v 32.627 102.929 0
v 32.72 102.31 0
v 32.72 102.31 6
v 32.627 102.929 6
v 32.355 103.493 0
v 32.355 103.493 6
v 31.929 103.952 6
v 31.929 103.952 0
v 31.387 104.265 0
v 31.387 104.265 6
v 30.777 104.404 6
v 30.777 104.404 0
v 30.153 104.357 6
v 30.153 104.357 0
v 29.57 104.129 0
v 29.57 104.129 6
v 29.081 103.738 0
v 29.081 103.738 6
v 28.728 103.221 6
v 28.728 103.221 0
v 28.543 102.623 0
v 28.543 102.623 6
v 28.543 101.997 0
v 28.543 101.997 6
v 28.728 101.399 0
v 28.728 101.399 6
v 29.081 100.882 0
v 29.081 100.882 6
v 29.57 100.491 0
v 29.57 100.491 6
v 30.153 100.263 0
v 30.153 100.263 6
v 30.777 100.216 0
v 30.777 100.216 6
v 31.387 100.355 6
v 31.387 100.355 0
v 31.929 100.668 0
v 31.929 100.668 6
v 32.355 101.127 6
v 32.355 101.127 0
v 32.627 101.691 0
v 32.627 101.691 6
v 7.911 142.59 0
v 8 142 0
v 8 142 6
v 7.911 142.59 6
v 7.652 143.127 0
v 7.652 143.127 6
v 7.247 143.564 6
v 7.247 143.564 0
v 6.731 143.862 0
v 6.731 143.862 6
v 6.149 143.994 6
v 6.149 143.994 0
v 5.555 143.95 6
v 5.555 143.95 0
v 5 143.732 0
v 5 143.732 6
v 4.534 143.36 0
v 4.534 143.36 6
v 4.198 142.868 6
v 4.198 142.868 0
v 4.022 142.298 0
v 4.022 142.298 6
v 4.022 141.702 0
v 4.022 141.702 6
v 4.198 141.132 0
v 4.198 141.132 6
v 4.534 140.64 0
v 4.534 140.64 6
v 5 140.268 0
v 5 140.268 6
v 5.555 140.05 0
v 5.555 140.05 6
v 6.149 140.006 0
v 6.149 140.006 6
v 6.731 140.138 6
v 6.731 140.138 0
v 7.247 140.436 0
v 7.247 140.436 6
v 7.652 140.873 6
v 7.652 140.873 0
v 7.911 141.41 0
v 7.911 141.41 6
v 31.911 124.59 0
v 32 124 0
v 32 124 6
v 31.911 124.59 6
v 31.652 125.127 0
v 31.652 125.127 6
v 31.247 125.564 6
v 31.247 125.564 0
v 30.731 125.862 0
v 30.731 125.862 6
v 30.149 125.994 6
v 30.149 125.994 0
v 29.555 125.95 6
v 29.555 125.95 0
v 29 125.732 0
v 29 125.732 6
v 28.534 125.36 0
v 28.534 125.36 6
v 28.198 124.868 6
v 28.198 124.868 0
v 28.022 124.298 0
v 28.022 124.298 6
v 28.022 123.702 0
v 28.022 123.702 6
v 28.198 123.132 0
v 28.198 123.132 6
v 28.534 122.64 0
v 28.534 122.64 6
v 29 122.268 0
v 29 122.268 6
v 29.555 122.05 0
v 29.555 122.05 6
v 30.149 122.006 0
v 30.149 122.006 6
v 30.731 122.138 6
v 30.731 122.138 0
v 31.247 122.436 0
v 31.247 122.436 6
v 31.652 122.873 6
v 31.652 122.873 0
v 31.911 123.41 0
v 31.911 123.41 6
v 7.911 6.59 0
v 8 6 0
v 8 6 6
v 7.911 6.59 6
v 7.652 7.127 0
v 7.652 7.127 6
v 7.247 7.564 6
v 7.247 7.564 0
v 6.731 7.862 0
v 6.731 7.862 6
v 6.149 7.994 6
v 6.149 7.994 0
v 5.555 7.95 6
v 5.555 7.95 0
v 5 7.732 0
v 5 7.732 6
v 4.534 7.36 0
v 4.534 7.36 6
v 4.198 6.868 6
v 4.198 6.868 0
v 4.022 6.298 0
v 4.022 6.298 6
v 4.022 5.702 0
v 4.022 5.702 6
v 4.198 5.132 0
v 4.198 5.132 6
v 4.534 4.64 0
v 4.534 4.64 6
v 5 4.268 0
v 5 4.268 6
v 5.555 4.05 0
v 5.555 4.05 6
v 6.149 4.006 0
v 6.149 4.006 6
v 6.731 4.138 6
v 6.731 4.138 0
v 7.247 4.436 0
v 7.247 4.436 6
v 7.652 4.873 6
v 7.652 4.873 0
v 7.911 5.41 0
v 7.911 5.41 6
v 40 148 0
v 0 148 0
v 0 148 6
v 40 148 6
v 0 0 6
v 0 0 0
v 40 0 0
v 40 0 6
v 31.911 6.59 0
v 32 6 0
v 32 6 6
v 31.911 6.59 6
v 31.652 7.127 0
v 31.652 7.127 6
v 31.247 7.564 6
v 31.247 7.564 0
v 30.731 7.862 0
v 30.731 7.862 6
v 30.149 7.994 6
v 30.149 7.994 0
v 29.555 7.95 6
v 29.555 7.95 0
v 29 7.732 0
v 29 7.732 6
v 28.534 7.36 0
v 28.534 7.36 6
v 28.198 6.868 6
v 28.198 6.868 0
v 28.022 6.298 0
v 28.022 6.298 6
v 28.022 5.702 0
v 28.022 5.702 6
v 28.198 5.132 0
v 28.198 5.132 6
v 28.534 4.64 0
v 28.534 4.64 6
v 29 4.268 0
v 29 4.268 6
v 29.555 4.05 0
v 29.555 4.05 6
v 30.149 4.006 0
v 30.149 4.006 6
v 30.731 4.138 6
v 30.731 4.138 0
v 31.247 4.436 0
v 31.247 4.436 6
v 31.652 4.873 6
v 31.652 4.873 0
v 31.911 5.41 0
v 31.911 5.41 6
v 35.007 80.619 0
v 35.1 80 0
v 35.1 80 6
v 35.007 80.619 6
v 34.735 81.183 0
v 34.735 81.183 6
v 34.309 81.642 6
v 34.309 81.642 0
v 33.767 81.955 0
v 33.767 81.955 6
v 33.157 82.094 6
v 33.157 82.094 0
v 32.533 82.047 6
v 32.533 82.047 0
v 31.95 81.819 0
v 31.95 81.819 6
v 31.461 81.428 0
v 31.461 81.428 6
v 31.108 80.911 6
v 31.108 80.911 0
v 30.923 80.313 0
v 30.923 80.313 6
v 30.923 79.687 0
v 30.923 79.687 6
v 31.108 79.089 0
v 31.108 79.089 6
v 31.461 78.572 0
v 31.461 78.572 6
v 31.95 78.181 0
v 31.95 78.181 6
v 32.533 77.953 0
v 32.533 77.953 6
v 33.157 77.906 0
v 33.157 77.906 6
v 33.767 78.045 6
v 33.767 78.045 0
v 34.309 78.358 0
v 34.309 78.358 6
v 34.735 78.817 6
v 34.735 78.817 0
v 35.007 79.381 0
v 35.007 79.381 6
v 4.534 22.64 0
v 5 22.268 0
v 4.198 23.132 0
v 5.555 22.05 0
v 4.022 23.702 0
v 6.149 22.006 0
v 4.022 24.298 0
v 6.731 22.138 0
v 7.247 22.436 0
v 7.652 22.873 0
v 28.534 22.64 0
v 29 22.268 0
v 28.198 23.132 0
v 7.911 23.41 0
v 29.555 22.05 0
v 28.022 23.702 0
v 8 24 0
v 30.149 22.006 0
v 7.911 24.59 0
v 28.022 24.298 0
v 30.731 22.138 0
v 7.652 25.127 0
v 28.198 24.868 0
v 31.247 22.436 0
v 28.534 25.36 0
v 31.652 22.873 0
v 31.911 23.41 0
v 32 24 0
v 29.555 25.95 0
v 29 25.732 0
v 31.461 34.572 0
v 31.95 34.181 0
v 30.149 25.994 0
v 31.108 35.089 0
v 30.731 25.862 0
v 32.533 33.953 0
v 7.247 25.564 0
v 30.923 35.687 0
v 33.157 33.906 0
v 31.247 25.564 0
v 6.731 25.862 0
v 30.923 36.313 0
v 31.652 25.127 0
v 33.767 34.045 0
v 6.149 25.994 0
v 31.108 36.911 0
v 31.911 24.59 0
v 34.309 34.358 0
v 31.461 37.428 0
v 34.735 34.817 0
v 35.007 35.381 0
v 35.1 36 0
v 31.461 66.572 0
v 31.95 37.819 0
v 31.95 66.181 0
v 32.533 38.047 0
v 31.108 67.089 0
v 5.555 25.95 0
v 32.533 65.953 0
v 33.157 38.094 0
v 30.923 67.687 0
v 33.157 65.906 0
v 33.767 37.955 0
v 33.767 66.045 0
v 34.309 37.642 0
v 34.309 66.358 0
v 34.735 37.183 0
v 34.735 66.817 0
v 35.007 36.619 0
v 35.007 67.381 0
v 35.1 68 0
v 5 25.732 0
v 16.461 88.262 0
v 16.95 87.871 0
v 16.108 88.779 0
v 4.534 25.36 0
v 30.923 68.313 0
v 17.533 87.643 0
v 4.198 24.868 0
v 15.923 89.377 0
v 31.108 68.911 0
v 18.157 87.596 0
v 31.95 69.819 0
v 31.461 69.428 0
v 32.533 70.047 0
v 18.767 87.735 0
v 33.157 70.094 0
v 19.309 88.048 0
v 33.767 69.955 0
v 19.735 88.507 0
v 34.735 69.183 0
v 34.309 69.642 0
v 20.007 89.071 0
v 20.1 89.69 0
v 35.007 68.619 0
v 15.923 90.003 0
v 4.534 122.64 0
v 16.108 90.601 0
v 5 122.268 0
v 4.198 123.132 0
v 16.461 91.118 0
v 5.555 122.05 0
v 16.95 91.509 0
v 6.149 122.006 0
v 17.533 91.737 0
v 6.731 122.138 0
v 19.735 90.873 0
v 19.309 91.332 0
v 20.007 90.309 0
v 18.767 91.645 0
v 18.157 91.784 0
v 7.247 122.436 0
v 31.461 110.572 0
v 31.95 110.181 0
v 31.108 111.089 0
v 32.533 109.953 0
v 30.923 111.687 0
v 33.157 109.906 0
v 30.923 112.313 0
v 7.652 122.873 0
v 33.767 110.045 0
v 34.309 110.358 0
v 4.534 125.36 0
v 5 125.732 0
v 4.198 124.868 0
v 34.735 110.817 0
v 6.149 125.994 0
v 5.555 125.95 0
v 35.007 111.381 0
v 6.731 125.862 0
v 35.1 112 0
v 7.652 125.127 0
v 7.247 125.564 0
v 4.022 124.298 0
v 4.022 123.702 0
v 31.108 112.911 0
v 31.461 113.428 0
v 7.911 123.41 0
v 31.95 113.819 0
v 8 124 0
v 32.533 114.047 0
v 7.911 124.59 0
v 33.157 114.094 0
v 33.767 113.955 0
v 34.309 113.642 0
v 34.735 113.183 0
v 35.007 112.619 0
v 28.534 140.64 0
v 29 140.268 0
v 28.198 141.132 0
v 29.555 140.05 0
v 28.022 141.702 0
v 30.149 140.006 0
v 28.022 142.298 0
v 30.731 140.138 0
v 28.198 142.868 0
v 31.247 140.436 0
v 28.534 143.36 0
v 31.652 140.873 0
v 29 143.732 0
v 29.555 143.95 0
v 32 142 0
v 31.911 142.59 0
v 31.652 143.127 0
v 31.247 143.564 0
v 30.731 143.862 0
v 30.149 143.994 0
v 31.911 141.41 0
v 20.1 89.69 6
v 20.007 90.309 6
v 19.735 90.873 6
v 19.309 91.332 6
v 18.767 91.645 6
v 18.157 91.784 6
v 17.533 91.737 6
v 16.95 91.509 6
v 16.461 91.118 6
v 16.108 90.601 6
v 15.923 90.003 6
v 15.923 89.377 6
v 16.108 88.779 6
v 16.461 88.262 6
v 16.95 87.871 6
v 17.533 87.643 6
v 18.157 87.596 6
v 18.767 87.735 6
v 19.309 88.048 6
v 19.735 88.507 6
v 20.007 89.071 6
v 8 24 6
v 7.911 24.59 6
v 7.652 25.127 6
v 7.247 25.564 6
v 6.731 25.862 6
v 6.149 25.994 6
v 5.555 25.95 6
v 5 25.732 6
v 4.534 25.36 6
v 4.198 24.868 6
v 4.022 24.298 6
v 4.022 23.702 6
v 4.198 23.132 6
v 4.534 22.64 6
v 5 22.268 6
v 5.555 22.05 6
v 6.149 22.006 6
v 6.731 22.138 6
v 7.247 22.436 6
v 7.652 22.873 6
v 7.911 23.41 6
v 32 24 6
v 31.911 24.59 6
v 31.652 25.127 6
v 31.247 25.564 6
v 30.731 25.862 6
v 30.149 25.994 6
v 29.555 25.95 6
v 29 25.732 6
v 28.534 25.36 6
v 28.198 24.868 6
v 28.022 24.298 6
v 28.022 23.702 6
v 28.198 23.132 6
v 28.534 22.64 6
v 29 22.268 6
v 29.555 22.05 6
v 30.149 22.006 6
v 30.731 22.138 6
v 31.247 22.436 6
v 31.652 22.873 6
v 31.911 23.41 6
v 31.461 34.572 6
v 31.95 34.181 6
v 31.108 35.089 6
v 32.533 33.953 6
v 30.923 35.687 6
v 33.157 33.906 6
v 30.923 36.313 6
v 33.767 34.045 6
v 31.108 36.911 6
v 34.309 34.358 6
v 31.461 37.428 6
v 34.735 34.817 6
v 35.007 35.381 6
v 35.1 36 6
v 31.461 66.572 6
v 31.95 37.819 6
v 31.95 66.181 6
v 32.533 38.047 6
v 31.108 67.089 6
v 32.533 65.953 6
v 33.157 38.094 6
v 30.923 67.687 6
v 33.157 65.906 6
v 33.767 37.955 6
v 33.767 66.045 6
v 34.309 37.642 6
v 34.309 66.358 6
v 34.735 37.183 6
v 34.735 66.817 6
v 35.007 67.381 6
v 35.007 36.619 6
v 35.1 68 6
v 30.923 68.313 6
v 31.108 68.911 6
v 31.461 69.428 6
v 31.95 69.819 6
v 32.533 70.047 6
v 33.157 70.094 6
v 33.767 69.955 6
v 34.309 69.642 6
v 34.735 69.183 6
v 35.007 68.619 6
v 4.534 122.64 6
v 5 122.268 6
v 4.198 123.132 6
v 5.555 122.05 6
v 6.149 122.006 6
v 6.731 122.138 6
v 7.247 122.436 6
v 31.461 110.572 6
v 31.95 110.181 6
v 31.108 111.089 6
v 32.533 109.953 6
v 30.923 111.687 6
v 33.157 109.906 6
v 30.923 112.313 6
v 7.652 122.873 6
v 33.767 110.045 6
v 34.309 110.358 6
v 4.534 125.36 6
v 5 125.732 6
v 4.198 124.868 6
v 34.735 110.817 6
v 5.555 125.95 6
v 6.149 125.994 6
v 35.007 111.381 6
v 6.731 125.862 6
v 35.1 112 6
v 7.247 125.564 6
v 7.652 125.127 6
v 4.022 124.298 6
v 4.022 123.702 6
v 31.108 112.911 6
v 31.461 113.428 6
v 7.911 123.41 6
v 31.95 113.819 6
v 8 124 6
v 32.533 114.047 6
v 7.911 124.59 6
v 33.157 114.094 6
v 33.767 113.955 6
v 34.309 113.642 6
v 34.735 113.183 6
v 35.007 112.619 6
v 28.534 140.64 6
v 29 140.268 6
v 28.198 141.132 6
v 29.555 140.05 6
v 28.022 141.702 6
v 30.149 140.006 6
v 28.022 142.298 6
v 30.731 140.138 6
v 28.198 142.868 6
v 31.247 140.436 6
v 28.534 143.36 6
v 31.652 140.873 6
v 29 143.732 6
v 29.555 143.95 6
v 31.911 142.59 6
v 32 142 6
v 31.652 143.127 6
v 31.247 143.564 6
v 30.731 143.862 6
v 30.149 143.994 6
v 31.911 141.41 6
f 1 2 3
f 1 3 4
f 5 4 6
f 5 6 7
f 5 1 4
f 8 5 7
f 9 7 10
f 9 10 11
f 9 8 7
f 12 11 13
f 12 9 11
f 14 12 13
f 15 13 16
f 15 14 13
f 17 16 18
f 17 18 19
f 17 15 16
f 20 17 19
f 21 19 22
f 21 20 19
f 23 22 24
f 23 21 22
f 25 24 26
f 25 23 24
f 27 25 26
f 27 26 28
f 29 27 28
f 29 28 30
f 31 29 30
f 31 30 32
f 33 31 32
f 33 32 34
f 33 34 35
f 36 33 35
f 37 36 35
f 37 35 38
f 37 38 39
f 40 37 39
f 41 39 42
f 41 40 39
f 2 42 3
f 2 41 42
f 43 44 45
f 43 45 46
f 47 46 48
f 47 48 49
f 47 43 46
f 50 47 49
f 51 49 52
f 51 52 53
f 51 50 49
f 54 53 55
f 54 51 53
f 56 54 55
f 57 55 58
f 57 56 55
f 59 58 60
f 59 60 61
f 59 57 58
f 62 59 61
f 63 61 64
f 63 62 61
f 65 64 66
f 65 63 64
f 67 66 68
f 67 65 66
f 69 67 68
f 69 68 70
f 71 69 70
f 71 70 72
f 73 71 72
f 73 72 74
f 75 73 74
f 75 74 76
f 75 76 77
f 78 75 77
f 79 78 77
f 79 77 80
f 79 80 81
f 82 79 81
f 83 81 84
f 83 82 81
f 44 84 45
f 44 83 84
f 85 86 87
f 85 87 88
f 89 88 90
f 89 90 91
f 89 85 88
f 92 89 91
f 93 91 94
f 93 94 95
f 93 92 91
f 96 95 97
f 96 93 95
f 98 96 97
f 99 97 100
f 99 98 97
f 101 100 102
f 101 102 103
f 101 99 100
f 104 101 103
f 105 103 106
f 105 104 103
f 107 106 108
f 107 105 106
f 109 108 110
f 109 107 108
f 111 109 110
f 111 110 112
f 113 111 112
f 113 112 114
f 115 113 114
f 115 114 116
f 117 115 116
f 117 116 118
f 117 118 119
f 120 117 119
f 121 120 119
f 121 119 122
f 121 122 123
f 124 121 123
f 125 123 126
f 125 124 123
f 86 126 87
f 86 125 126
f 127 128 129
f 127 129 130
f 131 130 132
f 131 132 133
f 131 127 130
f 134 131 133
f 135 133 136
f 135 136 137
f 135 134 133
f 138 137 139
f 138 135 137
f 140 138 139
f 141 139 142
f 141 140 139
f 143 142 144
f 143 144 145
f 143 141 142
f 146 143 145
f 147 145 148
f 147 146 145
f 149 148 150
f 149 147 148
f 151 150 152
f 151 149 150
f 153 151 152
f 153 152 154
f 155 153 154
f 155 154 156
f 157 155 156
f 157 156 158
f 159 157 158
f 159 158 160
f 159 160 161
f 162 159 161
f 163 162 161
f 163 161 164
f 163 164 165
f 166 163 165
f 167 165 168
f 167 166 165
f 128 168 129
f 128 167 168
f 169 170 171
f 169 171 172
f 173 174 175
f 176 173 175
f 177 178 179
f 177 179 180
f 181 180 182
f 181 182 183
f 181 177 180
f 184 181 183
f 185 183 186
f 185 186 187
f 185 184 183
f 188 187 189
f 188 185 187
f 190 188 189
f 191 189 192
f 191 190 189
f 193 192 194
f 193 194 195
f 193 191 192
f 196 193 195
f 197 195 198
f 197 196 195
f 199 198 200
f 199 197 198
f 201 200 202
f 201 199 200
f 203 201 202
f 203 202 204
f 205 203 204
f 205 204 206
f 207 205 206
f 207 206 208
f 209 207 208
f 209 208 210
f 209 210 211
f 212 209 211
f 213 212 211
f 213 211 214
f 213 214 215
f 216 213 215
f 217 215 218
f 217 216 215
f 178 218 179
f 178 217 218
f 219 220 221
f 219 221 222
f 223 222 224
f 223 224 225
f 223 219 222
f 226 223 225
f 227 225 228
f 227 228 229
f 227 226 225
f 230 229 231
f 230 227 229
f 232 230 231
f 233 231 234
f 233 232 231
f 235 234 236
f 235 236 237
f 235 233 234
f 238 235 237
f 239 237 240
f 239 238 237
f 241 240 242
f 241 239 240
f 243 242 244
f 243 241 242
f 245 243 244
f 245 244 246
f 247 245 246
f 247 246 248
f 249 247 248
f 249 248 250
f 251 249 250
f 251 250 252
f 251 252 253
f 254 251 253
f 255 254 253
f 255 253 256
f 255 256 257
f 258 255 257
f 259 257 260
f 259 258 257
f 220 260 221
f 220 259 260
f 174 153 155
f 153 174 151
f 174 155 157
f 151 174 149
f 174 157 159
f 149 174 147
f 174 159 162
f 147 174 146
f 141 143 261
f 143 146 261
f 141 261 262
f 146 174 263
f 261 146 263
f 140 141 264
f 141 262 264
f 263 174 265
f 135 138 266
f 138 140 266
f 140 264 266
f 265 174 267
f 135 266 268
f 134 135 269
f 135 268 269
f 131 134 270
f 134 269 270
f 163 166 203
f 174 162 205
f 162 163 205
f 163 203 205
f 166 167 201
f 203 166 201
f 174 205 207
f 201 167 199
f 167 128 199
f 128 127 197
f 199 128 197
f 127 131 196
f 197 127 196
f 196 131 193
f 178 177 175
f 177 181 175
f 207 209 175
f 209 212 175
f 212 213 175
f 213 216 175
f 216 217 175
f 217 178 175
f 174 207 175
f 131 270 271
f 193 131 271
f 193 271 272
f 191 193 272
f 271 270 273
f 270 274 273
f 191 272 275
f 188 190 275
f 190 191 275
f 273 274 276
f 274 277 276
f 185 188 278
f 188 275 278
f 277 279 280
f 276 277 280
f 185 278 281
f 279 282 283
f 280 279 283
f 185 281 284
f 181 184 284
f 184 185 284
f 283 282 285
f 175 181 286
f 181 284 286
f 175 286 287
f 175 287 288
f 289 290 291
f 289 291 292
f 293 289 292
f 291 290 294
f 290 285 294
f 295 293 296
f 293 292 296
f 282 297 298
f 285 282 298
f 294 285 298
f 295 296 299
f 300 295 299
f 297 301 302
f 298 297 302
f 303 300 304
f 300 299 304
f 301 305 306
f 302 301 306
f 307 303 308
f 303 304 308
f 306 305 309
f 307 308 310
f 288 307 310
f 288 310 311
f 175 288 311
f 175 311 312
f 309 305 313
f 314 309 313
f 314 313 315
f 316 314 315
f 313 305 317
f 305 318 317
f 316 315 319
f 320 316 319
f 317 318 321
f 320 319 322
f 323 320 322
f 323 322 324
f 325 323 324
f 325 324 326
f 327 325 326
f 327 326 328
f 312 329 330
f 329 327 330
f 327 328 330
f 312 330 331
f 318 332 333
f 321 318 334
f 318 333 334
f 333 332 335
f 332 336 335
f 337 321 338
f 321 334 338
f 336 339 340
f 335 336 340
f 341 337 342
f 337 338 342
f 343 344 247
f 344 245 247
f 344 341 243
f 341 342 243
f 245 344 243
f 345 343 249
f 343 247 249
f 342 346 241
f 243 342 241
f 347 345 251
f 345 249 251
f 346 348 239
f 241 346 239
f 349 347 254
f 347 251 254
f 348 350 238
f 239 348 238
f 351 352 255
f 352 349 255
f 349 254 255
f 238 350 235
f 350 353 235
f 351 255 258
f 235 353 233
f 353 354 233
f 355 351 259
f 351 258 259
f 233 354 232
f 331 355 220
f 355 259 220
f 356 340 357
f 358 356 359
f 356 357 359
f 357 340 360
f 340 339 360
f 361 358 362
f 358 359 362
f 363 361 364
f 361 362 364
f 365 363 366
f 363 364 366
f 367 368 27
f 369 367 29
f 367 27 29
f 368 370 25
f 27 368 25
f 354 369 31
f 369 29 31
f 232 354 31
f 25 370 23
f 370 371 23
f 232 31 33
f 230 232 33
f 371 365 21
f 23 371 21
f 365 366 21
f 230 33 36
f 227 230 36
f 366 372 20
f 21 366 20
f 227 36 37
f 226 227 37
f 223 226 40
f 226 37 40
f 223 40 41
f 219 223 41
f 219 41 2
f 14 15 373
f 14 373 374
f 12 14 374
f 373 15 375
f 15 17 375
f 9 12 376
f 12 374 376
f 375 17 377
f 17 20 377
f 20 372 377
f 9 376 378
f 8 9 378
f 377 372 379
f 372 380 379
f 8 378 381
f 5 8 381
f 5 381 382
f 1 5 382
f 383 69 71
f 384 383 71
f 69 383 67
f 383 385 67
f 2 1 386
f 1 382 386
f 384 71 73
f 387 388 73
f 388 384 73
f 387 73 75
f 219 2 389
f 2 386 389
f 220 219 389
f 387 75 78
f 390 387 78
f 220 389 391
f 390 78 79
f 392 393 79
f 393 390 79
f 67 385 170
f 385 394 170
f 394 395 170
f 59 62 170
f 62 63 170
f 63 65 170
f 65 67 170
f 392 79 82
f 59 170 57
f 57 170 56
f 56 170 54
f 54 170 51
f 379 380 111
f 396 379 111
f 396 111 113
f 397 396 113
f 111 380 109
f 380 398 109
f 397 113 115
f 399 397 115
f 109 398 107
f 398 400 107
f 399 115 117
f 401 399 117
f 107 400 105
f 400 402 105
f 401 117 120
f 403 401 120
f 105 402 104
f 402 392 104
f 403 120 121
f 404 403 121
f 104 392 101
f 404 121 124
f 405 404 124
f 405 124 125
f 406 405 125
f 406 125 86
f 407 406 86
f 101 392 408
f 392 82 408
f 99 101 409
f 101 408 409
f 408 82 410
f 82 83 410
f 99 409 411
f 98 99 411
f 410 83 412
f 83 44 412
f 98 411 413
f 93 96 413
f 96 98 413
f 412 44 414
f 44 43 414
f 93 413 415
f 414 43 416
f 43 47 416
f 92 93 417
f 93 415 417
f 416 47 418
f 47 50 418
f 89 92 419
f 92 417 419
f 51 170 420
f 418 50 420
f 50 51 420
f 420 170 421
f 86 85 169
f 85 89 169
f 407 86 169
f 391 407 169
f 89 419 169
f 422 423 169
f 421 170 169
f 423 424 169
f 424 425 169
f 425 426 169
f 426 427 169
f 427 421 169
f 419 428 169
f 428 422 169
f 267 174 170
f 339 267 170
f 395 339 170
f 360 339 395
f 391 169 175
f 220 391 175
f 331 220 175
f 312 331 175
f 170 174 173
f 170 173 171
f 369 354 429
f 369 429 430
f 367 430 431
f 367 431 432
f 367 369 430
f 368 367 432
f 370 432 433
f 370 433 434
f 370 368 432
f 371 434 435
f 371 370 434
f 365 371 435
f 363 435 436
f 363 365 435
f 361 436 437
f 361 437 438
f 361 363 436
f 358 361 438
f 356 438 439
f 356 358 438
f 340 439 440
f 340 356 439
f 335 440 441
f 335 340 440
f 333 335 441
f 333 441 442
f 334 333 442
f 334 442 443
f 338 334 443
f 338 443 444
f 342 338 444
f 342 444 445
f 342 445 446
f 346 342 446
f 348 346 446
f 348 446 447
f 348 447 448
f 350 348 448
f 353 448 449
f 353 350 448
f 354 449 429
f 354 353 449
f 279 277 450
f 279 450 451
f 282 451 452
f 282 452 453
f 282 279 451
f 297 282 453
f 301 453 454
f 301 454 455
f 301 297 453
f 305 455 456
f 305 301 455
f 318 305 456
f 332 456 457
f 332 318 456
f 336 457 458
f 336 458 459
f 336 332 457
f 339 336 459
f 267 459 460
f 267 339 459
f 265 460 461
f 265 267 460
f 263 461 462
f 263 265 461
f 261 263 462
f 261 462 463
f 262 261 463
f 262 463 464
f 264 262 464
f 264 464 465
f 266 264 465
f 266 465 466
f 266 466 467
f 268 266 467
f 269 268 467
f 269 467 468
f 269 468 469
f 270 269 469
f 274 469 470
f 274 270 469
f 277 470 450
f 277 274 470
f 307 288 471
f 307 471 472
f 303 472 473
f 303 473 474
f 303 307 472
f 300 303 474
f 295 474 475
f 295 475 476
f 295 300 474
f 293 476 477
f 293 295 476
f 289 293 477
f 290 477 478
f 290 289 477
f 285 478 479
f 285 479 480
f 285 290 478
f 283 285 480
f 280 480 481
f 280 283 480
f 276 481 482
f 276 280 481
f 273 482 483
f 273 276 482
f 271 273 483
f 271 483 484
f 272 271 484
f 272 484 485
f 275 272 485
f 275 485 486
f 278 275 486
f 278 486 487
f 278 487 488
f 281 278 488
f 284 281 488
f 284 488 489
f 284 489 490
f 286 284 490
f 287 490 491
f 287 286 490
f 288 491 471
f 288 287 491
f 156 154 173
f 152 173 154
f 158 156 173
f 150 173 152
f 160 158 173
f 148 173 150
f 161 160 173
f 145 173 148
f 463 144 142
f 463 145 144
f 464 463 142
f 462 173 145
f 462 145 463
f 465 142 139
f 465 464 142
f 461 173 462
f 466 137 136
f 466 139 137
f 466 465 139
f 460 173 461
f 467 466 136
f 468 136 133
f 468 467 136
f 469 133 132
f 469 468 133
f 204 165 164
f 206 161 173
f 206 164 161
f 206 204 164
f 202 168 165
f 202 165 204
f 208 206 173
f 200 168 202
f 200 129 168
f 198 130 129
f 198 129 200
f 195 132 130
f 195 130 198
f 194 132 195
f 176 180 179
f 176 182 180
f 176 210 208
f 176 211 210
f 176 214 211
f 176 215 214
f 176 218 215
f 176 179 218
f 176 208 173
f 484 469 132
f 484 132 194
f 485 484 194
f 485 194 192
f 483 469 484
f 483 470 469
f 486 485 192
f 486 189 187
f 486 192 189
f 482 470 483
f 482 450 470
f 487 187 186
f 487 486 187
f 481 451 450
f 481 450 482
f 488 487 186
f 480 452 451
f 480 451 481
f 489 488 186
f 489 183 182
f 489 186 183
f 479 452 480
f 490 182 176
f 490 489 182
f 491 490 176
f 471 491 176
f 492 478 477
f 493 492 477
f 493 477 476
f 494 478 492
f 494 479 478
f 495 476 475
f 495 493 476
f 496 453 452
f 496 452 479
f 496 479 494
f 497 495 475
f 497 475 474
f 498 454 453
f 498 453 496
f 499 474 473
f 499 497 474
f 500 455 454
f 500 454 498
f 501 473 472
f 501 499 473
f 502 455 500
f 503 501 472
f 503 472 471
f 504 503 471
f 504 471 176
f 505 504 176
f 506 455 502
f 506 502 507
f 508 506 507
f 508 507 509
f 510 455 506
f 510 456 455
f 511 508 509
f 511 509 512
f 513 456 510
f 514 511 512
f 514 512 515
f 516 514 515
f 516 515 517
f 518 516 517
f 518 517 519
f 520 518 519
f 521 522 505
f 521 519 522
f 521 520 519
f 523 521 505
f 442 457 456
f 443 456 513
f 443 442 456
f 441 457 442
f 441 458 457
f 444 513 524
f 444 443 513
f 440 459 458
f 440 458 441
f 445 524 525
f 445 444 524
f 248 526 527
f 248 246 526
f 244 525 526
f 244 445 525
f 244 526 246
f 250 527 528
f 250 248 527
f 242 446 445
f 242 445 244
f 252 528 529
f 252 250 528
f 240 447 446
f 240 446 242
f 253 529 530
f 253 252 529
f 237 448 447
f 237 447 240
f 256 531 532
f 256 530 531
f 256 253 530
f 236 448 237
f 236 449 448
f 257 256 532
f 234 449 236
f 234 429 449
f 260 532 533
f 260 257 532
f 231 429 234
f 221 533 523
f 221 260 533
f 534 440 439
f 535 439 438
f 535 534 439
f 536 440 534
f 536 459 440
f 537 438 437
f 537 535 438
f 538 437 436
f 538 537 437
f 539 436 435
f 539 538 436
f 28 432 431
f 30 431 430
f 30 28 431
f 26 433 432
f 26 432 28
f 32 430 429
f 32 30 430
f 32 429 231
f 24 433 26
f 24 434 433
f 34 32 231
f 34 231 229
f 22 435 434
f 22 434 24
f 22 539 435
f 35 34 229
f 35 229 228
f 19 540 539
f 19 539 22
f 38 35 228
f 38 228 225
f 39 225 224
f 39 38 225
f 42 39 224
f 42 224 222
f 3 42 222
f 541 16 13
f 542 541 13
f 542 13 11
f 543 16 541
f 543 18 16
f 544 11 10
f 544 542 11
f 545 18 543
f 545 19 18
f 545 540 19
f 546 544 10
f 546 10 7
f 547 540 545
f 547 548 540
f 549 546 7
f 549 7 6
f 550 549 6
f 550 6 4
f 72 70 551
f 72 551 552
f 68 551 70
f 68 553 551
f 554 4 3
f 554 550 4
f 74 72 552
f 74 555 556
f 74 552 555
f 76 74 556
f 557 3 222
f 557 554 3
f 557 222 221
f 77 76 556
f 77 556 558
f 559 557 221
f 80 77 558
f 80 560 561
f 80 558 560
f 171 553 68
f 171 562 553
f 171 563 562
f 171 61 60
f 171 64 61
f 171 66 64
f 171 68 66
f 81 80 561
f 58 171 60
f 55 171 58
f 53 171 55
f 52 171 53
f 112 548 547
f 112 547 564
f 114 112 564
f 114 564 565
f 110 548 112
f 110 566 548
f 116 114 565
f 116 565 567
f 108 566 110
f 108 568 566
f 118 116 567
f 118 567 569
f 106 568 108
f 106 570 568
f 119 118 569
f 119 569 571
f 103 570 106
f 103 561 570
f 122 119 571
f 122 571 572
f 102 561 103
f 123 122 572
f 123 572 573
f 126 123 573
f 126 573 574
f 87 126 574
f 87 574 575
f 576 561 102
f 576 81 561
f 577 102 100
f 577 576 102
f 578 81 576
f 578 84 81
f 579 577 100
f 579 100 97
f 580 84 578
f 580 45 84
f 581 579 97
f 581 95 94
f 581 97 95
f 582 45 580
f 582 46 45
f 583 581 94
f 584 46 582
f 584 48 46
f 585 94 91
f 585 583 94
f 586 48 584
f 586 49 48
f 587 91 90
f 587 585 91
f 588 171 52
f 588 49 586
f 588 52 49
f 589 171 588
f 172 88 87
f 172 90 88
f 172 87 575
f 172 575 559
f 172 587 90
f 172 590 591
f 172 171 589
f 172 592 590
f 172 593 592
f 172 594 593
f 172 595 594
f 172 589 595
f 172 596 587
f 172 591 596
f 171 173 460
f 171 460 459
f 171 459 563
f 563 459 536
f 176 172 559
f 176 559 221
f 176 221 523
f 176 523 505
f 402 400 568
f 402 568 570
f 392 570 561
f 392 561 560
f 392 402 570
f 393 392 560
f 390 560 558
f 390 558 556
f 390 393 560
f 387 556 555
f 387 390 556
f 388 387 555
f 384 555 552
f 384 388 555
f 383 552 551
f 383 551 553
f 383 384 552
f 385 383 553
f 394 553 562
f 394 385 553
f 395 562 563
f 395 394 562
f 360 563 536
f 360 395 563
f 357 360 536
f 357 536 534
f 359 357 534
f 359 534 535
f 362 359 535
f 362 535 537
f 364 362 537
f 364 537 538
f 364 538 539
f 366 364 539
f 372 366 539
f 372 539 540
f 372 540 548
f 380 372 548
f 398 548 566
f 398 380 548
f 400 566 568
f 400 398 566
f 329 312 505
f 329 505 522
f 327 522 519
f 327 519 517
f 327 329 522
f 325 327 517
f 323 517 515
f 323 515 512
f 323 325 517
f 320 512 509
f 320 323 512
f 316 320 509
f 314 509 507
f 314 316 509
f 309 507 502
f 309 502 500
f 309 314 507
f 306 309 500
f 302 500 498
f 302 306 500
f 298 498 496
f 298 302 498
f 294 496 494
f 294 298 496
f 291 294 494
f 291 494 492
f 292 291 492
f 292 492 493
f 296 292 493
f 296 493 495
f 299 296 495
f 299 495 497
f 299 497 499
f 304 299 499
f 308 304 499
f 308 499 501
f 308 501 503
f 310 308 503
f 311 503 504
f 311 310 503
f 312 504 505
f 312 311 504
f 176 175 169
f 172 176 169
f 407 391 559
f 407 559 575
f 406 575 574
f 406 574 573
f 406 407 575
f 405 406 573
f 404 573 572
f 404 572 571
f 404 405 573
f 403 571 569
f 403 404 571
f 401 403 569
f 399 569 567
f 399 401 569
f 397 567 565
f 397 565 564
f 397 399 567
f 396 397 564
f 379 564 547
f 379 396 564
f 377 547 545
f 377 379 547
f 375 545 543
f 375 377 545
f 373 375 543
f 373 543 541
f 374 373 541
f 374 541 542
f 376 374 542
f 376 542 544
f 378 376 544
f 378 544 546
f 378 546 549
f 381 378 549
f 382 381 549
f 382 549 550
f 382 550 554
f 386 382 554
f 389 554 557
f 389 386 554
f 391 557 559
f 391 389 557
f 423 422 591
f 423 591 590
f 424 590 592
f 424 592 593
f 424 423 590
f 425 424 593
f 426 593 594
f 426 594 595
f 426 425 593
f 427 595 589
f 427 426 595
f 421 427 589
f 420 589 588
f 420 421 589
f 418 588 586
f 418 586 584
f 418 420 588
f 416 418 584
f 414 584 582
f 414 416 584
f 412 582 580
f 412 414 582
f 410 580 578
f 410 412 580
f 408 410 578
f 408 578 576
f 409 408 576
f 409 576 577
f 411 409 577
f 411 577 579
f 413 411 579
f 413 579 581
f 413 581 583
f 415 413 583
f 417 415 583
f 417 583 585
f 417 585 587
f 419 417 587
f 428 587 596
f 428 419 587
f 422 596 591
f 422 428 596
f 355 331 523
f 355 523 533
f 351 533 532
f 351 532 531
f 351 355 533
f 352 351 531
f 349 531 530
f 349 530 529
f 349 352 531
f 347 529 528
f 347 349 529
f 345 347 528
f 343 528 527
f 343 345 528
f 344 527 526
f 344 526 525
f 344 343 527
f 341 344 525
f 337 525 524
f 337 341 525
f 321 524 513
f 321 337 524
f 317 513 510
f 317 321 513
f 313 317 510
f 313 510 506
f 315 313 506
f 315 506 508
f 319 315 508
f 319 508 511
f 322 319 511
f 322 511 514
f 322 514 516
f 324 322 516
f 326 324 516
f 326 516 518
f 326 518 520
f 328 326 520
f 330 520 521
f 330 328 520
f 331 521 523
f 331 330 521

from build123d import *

# Parameters (mm, degrees)
F0_W     = 40
F0_H     = 148
F0_R     = 2
F0_R_2   = 2.1
F1_DEPTH = 6


with BuildPart() as f1:
    # F0 (on Top) → F1 (new body)
    with BuildSketch(Plane.XY):
        with Locations((20, 74)):
            Rectangle(F0_W, F0_H)
        with Locations((6, 6)):
            Circle(F0_R, mode=Mode.SUBTRACT)
        with Locations((6, 24)):
            Circle(F0_R, mode=Mode.SUBTRACT)
        with Locations((30, 6)):
            Circle(F0_R, mode=Mode.SUBTRACT)
        with Locations((30, 24)):
            Circle(F0_R, mode=Mode.SUBTRACT)
        with Locations((33, 36)):
            Circle(F0_R_2, mode=Mode.SUBTRACT)
        with Locations((33, 68)):
            Circle(F0_R_2, mode=Mode.SUBTRACT)
        with Locations((18, 89.69)):
            Circle(F0_R_2, mode=Mode.SUBTRACT)
        with Locations((6, 124)):
            Circle(F0_R, mode=Mode.SUBTRACT)
        with Locations((6, 142)):
            Circle(F0_R, mode=Mode.SUBTRACT)
        with Locations((33, 80)):
            Circle(F0_R_2, mode=Mode.SUBTRACT)
        with Locations((30.62, 102.31)):
            Circle(F0_R_2, mode=Mode.SUBTRACT)
        with Locations((33, 112)):
            Circle(F0_R_2, mode=Mode.SUBTRACT)
        with Locations((30, 124)):
            Circle(F0_R, mode=Mode.SUBTRACT)
        with Locations((30, 142)):
            Circle(F0_R, mode=Mode.SUBTRACT)
    extrude(amount=F1_DEPTH)


solid = f1.part
